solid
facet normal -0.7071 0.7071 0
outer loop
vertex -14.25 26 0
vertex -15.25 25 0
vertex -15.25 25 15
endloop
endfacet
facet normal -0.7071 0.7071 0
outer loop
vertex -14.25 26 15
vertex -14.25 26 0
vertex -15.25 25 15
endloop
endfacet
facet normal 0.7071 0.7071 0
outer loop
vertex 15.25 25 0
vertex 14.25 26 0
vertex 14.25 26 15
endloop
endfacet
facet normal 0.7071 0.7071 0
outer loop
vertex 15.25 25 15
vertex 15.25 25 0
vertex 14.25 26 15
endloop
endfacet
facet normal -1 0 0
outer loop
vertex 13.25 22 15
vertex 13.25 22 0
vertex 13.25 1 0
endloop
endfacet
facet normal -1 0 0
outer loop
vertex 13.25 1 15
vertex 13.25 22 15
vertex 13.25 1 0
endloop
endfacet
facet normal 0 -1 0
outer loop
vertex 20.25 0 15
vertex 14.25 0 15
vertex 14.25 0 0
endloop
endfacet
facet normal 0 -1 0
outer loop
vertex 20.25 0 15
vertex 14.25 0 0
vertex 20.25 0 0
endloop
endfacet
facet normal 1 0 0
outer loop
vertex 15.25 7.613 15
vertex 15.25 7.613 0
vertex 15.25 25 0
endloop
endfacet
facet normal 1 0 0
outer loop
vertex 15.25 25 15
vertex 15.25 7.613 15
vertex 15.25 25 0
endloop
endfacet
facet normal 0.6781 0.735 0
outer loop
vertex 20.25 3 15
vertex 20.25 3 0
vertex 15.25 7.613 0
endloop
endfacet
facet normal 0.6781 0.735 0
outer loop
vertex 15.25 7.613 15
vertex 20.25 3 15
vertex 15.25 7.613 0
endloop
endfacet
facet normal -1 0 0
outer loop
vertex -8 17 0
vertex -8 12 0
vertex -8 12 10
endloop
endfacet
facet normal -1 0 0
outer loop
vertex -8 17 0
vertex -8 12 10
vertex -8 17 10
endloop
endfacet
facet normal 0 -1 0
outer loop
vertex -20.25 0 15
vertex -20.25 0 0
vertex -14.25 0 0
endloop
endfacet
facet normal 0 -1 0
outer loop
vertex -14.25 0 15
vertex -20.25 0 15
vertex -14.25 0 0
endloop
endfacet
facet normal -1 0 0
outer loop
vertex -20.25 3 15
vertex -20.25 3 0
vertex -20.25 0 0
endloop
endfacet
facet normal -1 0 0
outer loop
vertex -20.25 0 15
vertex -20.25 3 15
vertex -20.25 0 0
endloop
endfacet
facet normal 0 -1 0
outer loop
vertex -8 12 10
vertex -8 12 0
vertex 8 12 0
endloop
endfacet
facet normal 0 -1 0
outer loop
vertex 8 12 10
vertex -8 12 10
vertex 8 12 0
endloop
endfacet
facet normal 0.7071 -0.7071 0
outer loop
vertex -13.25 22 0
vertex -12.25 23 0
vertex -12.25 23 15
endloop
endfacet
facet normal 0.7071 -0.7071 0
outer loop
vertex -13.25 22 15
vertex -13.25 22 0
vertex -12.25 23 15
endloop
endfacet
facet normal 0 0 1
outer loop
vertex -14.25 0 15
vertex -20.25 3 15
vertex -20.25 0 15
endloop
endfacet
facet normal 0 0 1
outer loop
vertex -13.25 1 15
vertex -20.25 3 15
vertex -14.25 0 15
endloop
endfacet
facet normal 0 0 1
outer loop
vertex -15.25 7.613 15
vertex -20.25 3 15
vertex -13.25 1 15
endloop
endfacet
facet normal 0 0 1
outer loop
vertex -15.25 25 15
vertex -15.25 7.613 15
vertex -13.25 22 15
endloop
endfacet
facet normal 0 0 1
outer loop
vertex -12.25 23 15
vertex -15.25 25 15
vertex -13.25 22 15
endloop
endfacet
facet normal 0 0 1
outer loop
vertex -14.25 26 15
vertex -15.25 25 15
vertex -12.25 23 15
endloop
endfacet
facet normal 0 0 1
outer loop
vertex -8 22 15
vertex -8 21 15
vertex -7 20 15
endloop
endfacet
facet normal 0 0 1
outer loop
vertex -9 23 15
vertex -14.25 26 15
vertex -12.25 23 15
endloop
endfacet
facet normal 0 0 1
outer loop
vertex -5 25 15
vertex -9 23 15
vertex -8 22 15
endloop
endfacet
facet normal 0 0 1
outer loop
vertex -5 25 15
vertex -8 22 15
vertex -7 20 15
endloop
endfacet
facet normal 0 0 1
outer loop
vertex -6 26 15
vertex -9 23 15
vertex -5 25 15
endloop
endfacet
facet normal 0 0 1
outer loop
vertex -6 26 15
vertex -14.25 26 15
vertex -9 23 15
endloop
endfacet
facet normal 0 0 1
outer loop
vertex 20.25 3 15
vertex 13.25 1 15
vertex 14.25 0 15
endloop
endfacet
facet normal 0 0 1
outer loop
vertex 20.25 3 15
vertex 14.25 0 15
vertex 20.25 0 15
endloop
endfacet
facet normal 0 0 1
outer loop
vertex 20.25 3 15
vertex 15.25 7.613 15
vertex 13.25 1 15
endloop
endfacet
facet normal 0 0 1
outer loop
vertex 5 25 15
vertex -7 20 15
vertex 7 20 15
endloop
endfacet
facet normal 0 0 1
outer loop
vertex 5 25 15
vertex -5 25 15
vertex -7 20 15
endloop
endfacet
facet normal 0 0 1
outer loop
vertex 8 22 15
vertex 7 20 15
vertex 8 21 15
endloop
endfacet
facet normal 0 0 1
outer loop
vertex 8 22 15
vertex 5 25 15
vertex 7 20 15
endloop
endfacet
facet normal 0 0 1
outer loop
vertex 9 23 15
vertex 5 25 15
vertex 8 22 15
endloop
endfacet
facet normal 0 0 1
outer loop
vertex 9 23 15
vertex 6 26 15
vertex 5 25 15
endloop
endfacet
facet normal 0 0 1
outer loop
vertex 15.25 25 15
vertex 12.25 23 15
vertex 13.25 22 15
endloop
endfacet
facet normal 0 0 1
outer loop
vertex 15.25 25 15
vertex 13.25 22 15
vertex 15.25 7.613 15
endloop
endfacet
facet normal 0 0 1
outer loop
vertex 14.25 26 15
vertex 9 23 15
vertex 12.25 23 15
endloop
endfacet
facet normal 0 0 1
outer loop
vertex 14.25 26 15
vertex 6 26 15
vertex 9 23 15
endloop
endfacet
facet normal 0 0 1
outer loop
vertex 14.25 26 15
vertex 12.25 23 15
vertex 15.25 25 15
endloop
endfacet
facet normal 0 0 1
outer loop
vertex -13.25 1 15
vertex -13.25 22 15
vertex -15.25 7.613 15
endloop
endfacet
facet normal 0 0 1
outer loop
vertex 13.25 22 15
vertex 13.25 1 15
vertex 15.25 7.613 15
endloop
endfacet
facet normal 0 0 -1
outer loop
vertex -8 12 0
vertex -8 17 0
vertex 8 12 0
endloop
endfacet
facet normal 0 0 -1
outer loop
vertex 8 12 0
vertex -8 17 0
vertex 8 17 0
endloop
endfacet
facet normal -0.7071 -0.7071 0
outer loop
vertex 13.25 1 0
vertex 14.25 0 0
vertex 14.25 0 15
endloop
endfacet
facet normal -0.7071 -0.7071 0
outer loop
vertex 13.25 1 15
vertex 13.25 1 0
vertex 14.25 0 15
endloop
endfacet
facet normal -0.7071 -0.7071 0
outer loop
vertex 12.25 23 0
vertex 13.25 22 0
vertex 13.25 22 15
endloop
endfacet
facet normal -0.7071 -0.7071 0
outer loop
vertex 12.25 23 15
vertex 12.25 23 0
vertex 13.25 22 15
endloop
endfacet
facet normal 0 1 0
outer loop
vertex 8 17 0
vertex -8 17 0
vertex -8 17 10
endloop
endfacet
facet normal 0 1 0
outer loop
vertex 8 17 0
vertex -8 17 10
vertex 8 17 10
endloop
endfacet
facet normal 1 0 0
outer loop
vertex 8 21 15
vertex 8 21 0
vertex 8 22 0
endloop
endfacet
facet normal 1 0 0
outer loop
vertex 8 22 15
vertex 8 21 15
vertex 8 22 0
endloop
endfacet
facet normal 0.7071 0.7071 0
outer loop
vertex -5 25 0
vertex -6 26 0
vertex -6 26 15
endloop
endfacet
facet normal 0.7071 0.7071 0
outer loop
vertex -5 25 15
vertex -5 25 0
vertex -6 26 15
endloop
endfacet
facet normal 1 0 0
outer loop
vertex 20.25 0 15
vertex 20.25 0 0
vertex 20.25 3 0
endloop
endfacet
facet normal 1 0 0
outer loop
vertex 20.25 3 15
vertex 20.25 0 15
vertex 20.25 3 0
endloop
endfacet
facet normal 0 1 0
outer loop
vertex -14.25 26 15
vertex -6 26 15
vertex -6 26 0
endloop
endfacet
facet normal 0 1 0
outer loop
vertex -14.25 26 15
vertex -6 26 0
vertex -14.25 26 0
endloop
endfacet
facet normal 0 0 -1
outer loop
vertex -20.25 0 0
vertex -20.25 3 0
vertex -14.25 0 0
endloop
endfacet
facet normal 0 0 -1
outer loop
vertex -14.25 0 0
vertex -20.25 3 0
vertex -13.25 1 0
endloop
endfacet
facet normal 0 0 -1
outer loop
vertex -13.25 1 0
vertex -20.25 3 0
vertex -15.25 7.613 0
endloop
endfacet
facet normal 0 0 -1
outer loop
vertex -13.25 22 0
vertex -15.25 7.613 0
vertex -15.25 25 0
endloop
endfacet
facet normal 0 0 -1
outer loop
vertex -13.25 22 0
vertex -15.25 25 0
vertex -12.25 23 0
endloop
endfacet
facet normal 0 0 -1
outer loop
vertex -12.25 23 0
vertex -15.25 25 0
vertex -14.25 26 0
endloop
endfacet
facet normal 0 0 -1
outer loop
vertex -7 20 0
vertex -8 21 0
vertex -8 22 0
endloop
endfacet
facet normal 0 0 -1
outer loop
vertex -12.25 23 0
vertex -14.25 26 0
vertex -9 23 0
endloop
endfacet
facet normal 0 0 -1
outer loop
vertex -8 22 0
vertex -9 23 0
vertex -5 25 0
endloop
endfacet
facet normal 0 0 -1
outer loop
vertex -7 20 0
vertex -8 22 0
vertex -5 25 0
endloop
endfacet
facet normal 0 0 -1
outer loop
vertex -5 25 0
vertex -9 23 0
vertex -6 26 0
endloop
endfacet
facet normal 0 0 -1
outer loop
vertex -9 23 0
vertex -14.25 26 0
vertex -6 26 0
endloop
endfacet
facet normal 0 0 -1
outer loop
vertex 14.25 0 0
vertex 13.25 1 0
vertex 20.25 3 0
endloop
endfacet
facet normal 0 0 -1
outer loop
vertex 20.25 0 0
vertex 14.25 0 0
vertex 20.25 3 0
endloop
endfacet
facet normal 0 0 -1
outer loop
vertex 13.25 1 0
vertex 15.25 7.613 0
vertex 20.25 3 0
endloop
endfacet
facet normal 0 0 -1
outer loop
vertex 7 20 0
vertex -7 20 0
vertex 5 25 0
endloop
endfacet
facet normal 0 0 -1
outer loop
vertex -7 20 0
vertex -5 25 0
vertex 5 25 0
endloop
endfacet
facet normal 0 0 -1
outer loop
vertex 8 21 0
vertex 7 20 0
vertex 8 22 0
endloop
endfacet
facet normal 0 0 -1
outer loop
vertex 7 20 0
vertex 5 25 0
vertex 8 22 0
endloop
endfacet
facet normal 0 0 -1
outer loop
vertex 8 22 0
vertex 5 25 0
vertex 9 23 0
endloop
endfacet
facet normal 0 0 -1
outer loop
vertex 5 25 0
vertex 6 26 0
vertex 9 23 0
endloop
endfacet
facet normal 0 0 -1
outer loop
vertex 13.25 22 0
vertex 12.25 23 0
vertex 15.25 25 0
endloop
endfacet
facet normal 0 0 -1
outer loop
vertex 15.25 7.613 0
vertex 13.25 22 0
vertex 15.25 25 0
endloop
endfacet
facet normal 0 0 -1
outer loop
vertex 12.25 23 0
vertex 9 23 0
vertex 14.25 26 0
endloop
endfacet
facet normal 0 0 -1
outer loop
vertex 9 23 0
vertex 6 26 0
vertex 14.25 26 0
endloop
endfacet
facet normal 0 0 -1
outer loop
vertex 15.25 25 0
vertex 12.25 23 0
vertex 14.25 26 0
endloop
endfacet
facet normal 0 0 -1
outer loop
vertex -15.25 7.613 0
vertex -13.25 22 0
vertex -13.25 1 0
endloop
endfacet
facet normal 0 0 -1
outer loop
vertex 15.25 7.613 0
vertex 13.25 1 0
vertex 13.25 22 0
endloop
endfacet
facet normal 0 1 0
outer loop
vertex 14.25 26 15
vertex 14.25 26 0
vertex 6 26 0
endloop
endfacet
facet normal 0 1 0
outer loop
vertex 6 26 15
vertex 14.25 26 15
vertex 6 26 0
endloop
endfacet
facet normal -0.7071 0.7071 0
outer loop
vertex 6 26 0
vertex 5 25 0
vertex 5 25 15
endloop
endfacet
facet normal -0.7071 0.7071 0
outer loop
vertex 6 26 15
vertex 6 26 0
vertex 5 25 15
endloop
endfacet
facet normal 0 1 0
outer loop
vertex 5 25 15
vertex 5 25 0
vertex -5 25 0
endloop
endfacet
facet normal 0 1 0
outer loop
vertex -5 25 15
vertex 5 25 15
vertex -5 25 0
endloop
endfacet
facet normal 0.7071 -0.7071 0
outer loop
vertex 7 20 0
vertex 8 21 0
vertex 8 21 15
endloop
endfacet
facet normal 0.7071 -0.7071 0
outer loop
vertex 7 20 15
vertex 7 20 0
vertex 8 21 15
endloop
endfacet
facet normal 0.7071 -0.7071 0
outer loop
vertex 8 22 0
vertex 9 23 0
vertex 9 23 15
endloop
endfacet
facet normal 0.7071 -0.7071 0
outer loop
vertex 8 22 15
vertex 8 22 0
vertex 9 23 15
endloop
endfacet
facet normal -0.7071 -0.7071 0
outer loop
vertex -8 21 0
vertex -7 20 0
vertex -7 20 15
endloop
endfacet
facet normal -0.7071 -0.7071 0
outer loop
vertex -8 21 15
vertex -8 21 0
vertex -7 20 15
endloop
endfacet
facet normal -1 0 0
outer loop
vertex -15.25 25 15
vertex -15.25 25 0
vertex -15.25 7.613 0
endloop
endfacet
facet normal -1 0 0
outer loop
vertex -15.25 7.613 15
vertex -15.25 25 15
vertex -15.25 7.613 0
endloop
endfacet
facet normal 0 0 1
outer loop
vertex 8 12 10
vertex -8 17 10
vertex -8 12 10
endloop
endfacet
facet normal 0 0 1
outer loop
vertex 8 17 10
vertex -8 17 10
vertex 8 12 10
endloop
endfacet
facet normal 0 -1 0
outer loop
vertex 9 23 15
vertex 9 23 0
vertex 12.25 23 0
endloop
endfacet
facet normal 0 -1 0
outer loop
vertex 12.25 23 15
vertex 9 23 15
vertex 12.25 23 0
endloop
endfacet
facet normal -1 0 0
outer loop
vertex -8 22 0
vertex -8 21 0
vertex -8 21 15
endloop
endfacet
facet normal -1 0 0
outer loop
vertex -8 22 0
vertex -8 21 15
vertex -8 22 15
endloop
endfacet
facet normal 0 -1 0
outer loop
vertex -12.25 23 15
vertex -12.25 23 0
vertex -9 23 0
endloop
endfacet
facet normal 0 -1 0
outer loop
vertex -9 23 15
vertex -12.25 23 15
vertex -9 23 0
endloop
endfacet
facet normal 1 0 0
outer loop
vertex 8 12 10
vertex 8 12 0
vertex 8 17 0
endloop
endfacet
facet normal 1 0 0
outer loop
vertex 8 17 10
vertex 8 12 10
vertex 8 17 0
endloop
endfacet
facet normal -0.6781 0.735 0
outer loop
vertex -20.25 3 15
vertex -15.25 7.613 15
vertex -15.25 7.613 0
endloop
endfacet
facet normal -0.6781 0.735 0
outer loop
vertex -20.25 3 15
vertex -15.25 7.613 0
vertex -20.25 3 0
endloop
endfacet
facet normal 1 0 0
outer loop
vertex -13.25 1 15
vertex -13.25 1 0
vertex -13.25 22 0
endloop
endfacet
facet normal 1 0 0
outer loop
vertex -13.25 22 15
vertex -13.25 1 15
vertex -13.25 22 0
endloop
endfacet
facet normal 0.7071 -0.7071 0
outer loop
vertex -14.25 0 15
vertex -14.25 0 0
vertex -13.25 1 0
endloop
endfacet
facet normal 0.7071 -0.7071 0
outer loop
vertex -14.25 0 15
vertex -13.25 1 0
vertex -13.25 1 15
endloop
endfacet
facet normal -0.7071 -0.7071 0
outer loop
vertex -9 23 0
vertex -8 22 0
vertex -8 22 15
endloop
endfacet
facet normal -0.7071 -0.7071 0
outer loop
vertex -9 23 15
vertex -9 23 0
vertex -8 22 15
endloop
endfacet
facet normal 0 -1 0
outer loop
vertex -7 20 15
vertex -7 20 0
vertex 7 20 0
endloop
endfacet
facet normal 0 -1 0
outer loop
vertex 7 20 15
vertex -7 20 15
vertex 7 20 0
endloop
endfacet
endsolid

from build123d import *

# Parameters (mm, degrees)
F0_W     = 16
F0_H     = 3
F1_DEPTH = 15
F2_SIZE  = 0.99999
F0_H_2   = 5
F3_DEPTH = 10


# Not quite as in the source:
# - a fillet or chamfer is up to 0.001 mm smaller than in the source, because OpenCascade refuses the exact size


with BuildPart() as f1:
    # F0 (on Top) → F1 (new body)
    with BuildSketch(Plane.XY):
        Polygon((-15.25, 7.6134982519), (-15.25, 0), (-13.25, 0), (-13.25, 23), (-8, 23), (8, 23), (13.25, 23), (13.25, 0), (15.25, 0), (15.25, 7.6134982519), (15.25, 26), (5, 26), (5, 25), (-5, 25), (-5, 26), (-15.25, 26), align=None)
        with Locations((0, 21.5)):
            Rectangle(F0_W, F0_H)
        Polygon((15.25, 7.6134982519), (15.25, 0), (20.25, 0), (20.25, 3), align=None)
        Polygon((-20.25, 0), (-15.25, 0), (-15.25, 7.6134982519), (-20.25, 3), align=None)
    extrude(amount=F1_DEPTH)

    # F2 (size 1 in the source; OpenCascade refuses exactly that, so slightly less here)
    f2_edges = [f1.edges().sort_by_distance(p)[0] for p in [
        (-13.25, 23, 7.5),
        (13.25, 23, 7.5),
        (15.25, 26, 7.5),
        (-15.25, 26, 7.5),
        (-5, 26, 7.5),
        (5, 26, 7.5),
        (-8, 23, 7.5),
        (-8, 20, 7.5),
        (8, 23, 7.5),
        (8, 20, 7.5),
        (13.25, 0, 7.5),
        (-13.25, 0, 7.5),
    ]]
    chamfer(f2_edges, length=F2_SIZE)


with BuildPart() as f3:
    # F0 (on Top) → F3 (new body)
    with BuildSketch(Plane.XY):
        with Locations((0, 14.5)):
            Rectangle(F0_W, F0_H_2)
    extrude(amount=F3_DEPTH)


solid = Compound([f1.part, f3.part])
